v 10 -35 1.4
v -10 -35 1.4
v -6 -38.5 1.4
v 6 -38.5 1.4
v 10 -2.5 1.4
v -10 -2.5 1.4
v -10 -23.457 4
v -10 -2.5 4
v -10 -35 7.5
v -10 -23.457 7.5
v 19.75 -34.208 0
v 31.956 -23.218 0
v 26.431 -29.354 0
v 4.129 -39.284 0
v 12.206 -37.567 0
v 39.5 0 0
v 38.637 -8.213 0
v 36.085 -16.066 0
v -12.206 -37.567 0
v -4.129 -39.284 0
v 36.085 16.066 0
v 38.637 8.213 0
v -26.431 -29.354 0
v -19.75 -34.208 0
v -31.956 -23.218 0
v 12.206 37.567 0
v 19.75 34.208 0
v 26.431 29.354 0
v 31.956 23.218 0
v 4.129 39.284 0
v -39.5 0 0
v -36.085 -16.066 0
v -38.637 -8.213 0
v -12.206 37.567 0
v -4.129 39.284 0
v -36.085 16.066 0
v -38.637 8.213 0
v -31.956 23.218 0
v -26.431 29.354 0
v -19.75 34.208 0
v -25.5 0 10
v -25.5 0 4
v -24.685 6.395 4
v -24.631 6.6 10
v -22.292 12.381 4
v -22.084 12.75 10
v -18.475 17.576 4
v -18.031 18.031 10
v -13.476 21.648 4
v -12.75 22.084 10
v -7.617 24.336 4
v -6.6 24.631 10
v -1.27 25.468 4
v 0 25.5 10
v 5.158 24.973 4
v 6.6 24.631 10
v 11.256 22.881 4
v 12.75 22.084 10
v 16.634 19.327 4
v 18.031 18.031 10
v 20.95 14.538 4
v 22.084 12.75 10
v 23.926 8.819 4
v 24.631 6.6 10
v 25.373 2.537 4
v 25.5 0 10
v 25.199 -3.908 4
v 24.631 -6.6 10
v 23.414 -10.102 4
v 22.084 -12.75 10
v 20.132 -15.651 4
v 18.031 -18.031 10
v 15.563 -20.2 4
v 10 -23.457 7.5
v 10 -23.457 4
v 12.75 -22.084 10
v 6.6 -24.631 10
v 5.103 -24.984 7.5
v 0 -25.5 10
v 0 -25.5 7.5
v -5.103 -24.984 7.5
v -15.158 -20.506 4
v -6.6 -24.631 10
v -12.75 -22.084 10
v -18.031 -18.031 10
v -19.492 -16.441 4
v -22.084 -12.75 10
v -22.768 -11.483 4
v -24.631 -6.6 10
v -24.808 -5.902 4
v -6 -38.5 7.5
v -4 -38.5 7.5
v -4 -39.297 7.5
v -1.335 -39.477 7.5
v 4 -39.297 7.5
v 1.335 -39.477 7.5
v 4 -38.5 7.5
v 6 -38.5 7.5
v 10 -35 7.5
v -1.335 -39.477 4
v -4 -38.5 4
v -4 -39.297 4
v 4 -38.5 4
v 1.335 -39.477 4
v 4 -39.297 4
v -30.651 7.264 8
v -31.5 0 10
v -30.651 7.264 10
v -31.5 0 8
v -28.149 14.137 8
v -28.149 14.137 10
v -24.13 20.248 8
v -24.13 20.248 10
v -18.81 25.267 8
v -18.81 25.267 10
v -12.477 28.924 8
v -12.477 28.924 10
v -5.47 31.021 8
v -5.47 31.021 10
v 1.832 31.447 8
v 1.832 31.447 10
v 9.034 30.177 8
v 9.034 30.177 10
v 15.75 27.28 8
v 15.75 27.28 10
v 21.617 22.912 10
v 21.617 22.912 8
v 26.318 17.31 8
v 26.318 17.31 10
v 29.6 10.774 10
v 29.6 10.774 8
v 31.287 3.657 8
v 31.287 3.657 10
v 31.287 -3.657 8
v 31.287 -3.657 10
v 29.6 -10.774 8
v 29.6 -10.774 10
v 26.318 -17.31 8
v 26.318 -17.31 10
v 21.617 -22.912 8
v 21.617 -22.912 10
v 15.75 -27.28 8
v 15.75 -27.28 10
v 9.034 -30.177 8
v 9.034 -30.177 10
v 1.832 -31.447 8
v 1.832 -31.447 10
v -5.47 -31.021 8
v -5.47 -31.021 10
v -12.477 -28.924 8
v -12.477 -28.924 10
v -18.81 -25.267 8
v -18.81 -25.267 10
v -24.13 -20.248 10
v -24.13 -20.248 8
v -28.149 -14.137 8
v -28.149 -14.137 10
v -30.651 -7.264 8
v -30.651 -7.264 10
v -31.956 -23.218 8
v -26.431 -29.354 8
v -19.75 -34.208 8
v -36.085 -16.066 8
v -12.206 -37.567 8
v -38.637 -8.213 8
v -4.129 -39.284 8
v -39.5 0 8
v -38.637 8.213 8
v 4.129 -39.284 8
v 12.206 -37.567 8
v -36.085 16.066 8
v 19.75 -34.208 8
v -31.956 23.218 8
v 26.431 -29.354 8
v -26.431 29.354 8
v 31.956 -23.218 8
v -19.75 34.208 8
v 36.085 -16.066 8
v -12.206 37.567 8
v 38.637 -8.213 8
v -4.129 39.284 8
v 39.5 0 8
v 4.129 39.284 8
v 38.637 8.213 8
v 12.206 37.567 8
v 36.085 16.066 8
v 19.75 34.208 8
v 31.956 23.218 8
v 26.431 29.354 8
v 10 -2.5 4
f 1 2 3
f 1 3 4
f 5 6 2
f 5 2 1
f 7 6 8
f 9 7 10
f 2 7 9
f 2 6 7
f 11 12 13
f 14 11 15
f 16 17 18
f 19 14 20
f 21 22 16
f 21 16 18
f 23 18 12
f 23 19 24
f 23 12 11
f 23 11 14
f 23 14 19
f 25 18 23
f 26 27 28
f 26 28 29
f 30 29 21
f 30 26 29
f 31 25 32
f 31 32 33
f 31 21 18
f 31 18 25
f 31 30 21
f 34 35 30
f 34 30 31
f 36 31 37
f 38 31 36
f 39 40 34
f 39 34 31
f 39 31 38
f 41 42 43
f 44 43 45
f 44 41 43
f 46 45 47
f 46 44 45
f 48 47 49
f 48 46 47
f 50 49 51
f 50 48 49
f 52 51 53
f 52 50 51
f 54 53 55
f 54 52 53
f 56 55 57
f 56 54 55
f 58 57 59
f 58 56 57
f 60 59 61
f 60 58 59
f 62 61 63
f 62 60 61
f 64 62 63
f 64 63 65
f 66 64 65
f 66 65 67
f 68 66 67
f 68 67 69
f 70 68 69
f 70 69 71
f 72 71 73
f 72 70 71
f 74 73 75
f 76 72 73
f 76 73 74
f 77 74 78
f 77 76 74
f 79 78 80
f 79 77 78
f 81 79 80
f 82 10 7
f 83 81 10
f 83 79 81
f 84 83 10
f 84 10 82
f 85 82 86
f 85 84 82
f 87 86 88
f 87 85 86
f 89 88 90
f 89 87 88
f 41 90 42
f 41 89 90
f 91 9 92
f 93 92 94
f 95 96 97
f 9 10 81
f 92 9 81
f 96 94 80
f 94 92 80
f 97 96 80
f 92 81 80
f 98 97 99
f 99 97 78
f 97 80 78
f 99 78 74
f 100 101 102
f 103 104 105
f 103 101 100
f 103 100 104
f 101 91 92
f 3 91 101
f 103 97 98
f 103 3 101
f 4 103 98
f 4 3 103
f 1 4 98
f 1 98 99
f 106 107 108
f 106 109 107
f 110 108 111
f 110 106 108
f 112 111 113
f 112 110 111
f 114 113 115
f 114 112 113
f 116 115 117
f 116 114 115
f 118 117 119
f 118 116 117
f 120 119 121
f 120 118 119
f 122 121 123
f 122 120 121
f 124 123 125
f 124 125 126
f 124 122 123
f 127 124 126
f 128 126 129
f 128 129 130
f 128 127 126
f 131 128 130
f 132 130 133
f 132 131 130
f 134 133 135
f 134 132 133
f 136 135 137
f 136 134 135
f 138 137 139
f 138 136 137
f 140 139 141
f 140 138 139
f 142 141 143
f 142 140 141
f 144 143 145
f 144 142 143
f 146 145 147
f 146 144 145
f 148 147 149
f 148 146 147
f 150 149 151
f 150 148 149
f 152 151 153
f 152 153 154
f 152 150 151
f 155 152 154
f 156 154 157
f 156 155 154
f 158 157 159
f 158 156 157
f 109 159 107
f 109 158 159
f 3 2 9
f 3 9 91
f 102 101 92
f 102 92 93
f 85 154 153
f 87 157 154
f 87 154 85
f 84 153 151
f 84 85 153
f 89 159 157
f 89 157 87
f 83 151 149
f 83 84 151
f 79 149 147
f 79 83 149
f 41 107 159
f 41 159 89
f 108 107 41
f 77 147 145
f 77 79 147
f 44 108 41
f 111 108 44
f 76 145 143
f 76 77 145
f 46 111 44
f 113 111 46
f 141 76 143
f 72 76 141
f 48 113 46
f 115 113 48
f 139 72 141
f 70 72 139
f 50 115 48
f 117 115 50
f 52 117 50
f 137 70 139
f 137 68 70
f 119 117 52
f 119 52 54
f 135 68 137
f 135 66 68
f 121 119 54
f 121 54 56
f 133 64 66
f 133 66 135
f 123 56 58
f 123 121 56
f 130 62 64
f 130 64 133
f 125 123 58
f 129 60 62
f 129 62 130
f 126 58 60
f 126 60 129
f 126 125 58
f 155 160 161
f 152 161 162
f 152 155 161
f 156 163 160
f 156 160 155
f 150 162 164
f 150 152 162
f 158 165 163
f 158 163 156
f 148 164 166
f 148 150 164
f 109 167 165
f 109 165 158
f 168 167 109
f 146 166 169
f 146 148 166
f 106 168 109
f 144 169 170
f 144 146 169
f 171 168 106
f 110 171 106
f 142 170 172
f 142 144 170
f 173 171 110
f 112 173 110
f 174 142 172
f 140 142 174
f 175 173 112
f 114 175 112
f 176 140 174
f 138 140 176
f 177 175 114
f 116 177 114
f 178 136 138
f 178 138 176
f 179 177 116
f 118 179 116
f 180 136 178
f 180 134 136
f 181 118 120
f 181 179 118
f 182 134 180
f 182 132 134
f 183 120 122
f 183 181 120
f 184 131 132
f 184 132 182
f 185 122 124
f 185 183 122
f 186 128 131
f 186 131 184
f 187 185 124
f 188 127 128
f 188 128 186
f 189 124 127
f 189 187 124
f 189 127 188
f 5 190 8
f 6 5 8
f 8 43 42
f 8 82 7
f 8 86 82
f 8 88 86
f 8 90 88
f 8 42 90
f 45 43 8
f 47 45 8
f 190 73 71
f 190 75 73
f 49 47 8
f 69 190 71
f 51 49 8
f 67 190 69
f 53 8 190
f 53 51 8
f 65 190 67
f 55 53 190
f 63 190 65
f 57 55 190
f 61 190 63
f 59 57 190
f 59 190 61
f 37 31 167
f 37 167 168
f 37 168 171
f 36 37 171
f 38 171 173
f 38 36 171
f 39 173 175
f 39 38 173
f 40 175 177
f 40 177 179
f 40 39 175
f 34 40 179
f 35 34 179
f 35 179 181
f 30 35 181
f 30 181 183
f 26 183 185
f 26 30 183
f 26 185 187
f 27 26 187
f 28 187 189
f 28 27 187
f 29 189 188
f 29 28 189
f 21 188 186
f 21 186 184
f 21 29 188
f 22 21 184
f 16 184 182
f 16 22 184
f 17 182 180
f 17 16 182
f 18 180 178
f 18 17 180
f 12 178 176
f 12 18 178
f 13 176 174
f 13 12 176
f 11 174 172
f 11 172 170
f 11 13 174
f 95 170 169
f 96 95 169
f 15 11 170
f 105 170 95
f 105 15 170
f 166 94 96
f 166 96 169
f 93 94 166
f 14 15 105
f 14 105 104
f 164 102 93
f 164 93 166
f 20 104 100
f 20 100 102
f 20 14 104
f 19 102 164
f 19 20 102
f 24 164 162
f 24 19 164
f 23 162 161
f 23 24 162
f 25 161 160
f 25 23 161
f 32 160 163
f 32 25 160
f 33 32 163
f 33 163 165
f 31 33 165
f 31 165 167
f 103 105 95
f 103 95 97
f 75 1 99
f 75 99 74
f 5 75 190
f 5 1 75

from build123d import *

# Parameters (mm, degrees)
F2_W     = 8
F2_H     = 0.65
F3_DEPTH = 3.5
F4_DEPTH = 2.6


with BuildPart() as f1:
    # F0 (on Front) → F1 (revolve)
    with BuildSketch(Plane.XZ):
        Polygon((-39.5, 8), (-39.5, 0), (0, 0), (0, 4), (-25.5, 4), (-25.5, 10), (-31.5, 10), (-31.5, 8), align=None)
    revolve(axis=Axis((0, 0, 4.935035), (0, 0, -1)))

    # F2 (on face) → F3 (cut)
    with BuildSketch(Plane.XY.offset(4)):
        with Locations((0, -39.175)):
            Rectangle(F2_W, F2_H)
        Polygon((4, -38.8), (4, -38.5), (-4, -38.5), (-4, -38.85), (4, -38.85), align=None)
        with BuildLine():
            Line((10, -23.457408), (10, -2.5))
            Line((10, -2.5), (-10, -2.5))
            Line((-10, -2.5), (-10, -23.457408))
            ThreePointArc((-10, -23.457408), (0, -25.5), (10, -23.457408))
        make_face()
        with BuildLine():
            Line((10, -35), (10, -23.457408))
            ThreePointArc((10, -23.457408), (0, -25.5), (-10, -23.457408))
            Line((-10, -23.457408), (-10, -35))
            Line((-10, -35), (-6, -38.5))
            Line((-6, -38.5), (-4, -38.5))
            Line((-4, -38.5), (4, -38.5))
            Line((4, -38.5), (6, -38.5))
            Line((6, -38.5), (10, -35))
        make_face()
    extrude(amount=F3_DEPTH, mode=Mode.SUBTRACT)

    # F2 (on face) → F4 (cut)
    with BuildSketch(Plane.XY.offset(4)):
        with BuildLine():
            Line((10, -23.457408), (10, -2.5))
            Line((10, -2.5), (-10, -2.5))
            Line((-10, -2.5), (-10, -23.457408))
            ThreePointArc((-10, -23.457408), (0, -25.5), (10, -23.457408))
        make_face()
        with BuildLine():
            Line((10, -35), (10, -23.457408))
            ThreePointArc((10, -23.457408), (0, -25.5), (-10, -23.457408))
            Line((-10, -23.457408), (-10, -35))
            Line((-10, -35), (-6, -38.5))
            Line((-6, -38.5), (-4, -38.5))
            Line((-4, -38.5), (4, -38.5))
            Line((4, -38.5), (6, -38.5))
            Line((6, -38.5), (10, -35))
        make_face()
    extrude(amount=-F4_DEPTH, mode=Mode.SUBTRACT)


solid = f1.part
